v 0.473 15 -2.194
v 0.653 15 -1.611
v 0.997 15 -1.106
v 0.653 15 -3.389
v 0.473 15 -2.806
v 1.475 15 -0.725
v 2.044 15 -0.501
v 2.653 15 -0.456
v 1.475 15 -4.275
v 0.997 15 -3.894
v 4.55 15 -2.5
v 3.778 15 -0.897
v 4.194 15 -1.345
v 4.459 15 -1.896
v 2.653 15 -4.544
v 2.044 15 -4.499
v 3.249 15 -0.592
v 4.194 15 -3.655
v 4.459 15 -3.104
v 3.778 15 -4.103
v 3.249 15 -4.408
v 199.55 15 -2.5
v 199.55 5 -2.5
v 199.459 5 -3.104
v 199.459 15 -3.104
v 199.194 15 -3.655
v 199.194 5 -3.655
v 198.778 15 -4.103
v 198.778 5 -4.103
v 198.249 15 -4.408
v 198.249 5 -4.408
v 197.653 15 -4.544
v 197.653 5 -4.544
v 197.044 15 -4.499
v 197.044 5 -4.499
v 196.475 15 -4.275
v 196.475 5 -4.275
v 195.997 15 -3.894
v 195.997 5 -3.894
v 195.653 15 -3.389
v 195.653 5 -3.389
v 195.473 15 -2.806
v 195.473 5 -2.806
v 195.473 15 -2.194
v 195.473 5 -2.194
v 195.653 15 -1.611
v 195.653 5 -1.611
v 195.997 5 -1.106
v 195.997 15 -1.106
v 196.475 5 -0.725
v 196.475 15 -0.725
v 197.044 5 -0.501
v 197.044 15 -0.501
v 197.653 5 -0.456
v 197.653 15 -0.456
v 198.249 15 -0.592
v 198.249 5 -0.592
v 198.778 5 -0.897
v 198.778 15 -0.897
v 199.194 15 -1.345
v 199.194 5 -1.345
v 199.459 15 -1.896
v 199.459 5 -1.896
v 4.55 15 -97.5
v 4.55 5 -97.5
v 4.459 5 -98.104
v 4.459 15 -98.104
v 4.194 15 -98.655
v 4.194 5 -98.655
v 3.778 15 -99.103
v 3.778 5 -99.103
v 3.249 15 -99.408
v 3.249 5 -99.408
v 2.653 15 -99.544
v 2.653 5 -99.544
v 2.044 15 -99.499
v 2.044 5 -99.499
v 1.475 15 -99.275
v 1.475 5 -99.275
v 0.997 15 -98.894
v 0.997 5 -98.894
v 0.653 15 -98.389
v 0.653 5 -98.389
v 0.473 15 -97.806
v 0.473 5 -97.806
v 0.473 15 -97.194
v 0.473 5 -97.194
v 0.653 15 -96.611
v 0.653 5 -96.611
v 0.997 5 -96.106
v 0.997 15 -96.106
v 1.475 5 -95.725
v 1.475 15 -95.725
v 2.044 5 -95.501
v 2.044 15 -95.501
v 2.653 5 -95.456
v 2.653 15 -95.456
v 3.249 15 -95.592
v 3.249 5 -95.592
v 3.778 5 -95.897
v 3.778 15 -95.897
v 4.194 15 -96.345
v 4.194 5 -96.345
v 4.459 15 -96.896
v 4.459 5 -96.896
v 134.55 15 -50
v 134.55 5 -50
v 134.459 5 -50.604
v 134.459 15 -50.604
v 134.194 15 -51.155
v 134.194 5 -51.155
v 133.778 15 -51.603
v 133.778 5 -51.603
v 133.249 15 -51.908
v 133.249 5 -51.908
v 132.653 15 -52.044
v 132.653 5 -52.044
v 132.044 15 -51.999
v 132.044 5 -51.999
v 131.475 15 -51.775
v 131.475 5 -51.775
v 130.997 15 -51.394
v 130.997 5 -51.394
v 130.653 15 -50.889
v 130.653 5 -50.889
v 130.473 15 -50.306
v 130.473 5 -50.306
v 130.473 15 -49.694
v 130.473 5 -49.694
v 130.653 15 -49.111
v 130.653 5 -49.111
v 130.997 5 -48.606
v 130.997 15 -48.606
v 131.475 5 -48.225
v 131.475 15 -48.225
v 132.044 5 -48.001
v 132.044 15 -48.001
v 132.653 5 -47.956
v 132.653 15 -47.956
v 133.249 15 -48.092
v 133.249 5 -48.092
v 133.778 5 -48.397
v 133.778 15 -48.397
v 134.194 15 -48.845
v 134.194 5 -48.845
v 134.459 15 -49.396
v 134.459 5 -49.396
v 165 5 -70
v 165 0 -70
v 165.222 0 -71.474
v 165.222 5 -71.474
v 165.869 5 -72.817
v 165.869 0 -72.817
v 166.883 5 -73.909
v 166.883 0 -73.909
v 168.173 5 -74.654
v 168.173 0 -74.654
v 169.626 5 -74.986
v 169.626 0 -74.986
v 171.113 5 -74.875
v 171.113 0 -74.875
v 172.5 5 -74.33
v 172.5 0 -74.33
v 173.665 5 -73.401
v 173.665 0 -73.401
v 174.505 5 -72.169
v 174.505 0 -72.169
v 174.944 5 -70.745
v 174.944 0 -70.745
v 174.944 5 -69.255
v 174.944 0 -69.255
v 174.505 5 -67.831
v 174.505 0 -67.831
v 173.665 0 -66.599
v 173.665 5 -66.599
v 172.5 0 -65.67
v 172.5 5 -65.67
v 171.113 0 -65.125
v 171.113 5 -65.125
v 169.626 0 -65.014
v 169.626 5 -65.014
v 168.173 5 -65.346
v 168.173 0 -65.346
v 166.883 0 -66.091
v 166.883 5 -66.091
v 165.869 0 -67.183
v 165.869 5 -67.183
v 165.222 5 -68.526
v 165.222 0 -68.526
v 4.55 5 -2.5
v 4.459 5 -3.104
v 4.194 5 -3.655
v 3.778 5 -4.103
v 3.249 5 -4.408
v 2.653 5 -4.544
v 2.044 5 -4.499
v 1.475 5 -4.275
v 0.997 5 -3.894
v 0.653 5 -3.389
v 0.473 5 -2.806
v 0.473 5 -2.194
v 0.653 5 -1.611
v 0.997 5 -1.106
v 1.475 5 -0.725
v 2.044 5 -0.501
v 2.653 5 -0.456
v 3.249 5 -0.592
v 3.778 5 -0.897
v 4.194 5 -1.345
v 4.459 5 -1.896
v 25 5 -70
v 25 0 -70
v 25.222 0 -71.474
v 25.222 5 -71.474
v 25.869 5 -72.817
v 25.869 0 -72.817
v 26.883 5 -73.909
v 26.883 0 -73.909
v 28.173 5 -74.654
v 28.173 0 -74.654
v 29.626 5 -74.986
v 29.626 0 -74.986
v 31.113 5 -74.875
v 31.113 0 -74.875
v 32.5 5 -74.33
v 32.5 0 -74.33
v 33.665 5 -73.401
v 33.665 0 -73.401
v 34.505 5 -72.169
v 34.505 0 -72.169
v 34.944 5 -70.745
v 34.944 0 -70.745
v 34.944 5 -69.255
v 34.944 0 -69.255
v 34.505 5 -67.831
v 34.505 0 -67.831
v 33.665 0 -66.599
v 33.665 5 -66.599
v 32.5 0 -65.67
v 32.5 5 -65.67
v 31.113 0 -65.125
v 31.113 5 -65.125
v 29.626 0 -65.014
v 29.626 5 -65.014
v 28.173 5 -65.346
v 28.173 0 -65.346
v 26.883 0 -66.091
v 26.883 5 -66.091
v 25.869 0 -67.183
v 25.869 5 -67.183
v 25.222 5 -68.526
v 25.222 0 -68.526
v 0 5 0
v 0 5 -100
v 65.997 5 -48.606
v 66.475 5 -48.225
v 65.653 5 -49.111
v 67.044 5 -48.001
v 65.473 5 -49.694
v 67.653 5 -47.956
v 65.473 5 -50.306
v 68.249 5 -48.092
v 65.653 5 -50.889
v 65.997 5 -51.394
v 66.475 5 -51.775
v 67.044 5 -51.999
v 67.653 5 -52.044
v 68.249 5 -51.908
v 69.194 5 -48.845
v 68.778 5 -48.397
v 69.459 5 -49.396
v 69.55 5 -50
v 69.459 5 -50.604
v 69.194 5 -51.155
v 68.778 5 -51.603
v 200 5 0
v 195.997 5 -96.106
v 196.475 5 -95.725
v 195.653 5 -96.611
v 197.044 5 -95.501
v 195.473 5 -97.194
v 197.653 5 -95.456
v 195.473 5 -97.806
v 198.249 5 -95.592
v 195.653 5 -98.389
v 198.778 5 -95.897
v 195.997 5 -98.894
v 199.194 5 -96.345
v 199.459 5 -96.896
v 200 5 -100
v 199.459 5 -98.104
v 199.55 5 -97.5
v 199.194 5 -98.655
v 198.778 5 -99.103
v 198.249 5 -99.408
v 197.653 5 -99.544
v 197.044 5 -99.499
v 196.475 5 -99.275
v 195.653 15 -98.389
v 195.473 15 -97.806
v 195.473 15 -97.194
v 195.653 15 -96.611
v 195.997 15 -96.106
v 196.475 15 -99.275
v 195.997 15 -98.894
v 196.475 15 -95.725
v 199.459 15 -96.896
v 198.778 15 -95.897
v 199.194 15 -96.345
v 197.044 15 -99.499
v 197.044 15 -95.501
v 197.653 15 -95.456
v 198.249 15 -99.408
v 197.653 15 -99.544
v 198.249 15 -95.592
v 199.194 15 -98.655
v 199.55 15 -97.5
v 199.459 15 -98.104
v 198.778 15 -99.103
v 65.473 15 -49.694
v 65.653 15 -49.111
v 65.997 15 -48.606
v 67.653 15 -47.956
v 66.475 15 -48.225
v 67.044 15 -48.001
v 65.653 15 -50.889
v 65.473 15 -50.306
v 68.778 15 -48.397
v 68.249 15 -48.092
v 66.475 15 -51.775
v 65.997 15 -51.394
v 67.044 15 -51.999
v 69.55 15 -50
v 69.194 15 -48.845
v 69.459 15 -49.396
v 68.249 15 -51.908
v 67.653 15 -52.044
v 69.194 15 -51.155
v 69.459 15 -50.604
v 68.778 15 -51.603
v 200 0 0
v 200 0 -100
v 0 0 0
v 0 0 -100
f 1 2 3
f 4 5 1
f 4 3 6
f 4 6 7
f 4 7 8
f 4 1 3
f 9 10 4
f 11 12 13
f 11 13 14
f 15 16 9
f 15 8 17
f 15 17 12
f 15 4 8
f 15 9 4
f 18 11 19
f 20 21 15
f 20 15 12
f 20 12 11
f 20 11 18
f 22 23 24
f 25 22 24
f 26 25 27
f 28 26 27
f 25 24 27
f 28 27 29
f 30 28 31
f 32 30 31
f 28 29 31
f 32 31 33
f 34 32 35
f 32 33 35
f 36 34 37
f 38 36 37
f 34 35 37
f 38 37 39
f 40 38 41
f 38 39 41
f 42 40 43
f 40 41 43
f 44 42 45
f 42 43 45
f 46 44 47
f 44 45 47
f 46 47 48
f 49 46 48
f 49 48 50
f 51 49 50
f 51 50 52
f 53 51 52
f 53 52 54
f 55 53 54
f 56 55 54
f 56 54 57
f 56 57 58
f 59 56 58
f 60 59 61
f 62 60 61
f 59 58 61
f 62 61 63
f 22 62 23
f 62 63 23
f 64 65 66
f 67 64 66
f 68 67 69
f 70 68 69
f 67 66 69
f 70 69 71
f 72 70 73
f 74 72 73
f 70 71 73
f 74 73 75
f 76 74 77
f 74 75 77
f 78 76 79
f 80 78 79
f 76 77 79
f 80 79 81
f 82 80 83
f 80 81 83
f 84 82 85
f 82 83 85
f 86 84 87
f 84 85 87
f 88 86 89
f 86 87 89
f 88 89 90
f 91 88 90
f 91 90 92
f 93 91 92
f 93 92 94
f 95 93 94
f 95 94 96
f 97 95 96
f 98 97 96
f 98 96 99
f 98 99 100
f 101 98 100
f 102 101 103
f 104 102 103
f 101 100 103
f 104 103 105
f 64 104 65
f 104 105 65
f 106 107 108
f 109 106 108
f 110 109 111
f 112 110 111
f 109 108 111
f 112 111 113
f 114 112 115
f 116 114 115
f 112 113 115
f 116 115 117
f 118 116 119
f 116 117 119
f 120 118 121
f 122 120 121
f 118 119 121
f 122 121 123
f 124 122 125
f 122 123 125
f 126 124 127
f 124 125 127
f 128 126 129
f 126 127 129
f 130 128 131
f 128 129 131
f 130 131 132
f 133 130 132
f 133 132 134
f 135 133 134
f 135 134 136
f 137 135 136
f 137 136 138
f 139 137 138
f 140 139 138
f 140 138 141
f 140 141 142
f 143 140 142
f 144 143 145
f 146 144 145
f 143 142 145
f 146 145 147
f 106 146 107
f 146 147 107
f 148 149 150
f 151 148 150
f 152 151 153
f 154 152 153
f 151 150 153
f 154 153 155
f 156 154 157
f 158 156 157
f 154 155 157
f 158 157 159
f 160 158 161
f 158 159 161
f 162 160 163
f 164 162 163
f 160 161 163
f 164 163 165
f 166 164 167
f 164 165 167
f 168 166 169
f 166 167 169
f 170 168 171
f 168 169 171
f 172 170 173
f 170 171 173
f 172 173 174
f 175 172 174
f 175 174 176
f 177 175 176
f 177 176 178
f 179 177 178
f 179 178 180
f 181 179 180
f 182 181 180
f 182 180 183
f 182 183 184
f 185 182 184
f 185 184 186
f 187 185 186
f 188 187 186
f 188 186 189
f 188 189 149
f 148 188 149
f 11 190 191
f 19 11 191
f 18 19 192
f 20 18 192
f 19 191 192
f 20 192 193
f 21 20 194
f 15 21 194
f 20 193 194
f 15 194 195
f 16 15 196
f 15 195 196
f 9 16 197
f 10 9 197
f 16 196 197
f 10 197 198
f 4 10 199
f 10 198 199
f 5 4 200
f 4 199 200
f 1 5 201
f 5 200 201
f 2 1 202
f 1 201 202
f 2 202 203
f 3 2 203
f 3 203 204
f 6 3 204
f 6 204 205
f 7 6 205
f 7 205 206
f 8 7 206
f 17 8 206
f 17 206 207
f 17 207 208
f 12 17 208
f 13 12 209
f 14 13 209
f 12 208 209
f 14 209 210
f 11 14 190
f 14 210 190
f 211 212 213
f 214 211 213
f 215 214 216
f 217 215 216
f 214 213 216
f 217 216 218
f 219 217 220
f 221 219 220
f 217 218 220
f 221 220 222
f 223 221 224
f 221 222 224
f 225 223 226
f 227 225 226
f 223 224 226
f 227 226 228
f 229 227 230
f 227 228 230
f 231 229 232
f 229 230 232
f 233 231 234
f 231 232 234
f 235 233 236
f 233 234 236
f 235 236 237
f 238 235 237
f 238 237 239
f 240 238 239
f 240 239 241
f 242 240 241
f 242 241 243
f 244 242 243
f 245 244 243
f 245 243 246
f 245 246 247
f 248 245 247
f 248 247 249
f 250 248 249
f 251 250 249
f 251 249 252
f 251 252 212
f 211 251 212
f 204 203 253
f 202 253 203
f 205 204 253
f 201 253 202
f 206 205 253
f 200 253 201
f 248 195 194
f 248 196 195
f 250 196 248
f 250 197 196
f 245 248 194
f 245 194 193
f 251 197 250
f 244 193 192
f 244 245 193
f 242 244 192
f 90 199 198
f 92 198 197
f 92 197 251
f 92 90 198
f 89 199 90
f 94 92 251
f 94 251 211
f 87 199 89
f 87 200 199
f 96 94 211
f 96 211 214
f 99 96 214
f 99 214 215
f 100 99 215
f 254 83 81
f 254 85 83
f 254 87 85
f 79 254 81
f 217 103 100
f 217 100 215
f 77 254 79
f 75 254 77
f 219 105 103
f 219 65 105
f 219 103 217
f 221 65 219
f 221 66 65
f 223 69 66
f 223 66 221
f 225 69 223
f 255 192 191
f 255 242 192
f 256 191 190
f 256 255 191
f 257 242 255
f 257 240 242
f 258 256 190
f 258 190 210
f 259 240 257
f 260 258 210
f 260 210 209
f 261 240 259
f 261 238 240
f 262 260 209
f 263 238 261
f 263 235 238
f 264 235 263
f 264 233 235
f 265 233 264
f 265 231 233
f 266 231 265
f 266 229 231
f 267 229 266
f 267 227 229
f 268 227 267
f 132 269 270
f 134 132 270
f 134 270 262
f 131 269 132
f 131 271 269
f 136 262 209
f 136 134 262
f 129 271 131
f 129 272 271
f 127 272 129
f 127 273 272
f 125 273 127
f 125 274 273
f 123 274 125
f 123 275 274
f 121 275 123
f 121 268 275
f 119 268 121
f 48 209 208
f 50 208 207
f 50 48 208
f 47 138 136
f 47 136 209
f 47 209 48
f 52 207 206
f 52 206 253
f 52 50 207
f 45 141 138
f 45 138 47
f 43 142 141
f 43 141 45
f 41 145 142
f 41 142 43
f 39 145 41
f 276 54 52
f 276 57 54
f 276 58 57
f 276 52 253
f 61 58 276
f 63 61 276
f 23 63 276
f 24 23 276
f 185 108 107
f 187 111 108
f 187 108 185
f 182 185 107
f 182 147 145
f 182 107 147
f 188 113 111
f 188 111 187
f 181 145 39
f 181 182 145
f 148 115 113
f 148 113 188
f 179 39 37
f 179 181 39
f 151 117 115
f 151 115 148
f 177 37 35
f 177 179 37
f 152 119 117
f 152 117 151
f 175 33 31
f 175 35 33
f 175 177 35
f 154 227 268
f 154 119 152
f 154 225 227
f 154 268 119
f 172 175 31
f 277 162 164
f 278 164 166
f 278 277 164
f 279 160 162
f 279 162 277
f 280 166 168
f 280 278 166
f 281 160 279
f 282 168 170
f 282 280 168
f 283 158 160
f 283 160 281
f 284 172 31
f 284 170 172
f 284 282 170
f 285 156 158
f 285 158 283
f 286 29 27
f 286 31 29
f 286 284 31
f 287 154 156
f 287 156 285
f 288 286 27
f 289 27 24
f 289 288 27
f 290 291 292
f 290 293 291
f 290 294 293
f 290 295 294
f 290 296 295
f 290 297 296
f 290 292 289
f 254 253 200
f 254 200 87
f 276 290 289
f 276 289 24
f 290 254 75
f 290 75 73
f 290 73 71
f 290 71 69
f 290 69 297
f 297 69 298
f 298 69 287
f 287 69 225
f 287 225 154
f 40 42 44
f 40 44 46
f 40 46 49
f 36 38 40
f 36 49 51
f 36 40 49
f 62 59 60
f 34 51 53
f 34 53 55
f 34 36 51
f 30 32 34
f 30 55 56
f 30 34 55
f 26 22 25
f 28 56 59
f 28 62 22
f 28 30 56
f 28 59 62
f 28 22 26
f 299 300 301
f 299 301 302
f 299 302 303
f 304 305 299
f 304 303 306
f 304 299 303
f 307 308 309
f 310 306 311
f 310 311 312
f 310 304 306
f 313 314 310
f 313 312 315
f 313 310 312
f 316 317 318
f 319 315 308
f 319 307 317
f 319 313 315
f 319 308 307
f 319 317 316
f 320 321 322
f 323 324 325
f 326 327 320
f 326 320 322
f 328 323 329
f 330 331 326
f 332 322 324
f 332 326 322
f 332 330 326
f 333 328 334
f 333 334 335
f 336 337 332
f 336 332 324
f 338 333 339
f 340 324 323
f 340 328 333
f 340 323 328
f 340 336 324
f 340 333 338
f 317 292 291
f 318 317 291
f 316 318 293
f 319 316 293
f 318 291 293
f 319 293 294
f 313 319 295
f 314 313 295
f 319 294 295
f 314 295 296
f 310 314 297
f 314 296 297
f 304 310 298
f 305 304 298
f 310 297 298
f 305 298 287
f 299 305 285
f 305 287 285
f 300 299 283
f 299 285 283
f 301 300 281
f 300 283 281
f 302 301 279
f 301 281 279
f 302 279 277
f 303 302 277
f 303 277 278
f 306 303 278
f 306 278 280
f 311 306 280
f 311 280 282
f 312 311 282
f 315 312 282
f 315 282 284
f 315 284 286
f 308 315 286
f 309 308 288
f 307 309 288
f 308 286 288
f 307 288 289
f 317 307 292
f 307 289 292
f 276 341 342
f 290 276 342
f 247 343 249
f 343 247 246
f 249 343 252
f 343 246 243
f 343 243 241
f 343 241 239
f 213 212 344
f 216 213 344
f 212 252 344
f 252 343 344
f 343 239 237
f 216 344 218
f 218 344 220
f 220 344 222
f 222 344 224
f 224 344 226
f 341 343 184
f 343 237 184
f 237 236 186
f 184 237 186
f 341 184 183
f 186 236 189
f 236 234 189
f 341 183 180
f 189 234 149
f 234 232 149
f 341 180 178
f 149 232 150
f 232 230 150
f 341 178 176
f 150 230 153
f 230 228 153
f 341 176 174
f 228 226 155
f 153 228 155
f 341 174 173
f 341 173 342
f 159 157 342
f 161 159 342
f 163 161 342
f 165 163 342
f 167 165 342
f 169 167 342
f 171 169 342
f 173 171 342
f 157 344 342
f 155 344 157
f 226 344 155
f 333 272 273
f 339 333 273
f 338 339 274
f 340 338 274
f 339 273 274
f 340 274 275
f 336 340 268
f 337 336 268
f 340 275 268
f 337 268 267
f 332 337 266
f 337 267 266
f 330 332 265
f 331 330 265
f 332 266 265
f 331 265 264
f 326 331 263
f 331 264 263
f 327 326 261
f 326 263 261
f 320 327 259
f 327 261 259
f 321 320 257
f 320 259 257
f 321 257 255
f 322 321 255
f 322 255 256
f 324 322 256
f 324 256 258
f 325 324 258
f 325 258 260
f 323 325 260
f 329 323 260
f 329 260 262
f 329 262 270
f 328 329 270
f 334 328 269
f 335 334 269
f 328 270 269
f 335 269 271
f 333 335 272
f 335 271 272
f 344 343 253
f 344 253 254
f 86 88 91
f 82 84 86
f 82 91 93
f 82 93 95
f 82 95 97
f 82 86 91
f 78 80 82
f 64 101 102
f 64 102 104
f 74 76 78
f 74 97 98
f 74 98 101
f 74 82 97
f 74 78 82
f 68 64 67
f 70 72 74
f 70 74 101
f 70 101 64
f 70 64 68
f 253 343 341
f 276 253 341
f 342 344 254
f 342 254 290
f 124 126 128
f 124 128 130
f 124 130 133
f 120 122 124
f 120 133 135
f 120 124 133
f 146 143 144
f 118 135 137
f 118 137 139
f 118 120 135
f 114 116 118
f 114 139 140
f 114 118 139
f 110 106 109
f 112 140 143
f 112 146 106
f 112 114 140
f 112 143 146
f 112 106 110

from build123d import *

# Parameters (mm, degrees)
SKETCH1_W           = 200
SKETCH1_H           = 100
BOSS_EXTRUDE1_DEPTH = 5
SKETCH2_R           = 2.05
BOSS_EXTRUDE2_DEPTH = 10
SKETCH3_R           = 5
CUT_EXTRUDE1_DEPTH  = 10


with BuildPart() as part:
    # Sketch1 → Boss-Extrude1 (new body)
    with BuildSketch(Plane(origin=(0, 0, 0), x_dir=(1, 0, 0), z_dir=(0, 1, 0))):
        with Locations((100, 50)):
            Rectangle(SKETCH1_W, SKETCH1_H)
    extrude(amount=BOSS_EXTRUDE1_DEPTH)

    # Sketch2 → Boss-Extrude2 (add)
    with BuildSketch(Plane(origin=(0, 5, 0), x_dir=(1, 0, 0), z_dir=(0, 1, 0))):
        with Locations((2.5, 97.5)):
            Circle(SKETCH2_R)
        with Locations((197.5, 97.5)):
            Circle(SKETCH2_R)
        with Locations((197.5, 2.5)):
            Circle(SKETCH2_R)
        with Locations((2.5, 2.5)):
            Circle(SKETCH2_R)
        with Locations((67.5, 50)):
            Circle(SKETCH2_R)
        with Locations((132.5, 50)):
            Circle(SKETCH2_R)
    extrude(amount=BOSS_EXTRUDE2_DEPTH)

    # Sketch3 → Cut-Extrude1 (cut)
    with BuildSketch(Plane(origin=(0, 0, 0), x_dir=(-1, 0, 0), z_dir=(0, -1, 0))):
        with Locations((-170, 70)):
            Circle(SKETCH3_R)
        with Locations((-30, 70)):
            Circle(SKETCH3_R)
    extrude(amount=-CUT_EXTRUDE1_DEPTH, mode=Mode.SUBTRACT)


solid = part.part
